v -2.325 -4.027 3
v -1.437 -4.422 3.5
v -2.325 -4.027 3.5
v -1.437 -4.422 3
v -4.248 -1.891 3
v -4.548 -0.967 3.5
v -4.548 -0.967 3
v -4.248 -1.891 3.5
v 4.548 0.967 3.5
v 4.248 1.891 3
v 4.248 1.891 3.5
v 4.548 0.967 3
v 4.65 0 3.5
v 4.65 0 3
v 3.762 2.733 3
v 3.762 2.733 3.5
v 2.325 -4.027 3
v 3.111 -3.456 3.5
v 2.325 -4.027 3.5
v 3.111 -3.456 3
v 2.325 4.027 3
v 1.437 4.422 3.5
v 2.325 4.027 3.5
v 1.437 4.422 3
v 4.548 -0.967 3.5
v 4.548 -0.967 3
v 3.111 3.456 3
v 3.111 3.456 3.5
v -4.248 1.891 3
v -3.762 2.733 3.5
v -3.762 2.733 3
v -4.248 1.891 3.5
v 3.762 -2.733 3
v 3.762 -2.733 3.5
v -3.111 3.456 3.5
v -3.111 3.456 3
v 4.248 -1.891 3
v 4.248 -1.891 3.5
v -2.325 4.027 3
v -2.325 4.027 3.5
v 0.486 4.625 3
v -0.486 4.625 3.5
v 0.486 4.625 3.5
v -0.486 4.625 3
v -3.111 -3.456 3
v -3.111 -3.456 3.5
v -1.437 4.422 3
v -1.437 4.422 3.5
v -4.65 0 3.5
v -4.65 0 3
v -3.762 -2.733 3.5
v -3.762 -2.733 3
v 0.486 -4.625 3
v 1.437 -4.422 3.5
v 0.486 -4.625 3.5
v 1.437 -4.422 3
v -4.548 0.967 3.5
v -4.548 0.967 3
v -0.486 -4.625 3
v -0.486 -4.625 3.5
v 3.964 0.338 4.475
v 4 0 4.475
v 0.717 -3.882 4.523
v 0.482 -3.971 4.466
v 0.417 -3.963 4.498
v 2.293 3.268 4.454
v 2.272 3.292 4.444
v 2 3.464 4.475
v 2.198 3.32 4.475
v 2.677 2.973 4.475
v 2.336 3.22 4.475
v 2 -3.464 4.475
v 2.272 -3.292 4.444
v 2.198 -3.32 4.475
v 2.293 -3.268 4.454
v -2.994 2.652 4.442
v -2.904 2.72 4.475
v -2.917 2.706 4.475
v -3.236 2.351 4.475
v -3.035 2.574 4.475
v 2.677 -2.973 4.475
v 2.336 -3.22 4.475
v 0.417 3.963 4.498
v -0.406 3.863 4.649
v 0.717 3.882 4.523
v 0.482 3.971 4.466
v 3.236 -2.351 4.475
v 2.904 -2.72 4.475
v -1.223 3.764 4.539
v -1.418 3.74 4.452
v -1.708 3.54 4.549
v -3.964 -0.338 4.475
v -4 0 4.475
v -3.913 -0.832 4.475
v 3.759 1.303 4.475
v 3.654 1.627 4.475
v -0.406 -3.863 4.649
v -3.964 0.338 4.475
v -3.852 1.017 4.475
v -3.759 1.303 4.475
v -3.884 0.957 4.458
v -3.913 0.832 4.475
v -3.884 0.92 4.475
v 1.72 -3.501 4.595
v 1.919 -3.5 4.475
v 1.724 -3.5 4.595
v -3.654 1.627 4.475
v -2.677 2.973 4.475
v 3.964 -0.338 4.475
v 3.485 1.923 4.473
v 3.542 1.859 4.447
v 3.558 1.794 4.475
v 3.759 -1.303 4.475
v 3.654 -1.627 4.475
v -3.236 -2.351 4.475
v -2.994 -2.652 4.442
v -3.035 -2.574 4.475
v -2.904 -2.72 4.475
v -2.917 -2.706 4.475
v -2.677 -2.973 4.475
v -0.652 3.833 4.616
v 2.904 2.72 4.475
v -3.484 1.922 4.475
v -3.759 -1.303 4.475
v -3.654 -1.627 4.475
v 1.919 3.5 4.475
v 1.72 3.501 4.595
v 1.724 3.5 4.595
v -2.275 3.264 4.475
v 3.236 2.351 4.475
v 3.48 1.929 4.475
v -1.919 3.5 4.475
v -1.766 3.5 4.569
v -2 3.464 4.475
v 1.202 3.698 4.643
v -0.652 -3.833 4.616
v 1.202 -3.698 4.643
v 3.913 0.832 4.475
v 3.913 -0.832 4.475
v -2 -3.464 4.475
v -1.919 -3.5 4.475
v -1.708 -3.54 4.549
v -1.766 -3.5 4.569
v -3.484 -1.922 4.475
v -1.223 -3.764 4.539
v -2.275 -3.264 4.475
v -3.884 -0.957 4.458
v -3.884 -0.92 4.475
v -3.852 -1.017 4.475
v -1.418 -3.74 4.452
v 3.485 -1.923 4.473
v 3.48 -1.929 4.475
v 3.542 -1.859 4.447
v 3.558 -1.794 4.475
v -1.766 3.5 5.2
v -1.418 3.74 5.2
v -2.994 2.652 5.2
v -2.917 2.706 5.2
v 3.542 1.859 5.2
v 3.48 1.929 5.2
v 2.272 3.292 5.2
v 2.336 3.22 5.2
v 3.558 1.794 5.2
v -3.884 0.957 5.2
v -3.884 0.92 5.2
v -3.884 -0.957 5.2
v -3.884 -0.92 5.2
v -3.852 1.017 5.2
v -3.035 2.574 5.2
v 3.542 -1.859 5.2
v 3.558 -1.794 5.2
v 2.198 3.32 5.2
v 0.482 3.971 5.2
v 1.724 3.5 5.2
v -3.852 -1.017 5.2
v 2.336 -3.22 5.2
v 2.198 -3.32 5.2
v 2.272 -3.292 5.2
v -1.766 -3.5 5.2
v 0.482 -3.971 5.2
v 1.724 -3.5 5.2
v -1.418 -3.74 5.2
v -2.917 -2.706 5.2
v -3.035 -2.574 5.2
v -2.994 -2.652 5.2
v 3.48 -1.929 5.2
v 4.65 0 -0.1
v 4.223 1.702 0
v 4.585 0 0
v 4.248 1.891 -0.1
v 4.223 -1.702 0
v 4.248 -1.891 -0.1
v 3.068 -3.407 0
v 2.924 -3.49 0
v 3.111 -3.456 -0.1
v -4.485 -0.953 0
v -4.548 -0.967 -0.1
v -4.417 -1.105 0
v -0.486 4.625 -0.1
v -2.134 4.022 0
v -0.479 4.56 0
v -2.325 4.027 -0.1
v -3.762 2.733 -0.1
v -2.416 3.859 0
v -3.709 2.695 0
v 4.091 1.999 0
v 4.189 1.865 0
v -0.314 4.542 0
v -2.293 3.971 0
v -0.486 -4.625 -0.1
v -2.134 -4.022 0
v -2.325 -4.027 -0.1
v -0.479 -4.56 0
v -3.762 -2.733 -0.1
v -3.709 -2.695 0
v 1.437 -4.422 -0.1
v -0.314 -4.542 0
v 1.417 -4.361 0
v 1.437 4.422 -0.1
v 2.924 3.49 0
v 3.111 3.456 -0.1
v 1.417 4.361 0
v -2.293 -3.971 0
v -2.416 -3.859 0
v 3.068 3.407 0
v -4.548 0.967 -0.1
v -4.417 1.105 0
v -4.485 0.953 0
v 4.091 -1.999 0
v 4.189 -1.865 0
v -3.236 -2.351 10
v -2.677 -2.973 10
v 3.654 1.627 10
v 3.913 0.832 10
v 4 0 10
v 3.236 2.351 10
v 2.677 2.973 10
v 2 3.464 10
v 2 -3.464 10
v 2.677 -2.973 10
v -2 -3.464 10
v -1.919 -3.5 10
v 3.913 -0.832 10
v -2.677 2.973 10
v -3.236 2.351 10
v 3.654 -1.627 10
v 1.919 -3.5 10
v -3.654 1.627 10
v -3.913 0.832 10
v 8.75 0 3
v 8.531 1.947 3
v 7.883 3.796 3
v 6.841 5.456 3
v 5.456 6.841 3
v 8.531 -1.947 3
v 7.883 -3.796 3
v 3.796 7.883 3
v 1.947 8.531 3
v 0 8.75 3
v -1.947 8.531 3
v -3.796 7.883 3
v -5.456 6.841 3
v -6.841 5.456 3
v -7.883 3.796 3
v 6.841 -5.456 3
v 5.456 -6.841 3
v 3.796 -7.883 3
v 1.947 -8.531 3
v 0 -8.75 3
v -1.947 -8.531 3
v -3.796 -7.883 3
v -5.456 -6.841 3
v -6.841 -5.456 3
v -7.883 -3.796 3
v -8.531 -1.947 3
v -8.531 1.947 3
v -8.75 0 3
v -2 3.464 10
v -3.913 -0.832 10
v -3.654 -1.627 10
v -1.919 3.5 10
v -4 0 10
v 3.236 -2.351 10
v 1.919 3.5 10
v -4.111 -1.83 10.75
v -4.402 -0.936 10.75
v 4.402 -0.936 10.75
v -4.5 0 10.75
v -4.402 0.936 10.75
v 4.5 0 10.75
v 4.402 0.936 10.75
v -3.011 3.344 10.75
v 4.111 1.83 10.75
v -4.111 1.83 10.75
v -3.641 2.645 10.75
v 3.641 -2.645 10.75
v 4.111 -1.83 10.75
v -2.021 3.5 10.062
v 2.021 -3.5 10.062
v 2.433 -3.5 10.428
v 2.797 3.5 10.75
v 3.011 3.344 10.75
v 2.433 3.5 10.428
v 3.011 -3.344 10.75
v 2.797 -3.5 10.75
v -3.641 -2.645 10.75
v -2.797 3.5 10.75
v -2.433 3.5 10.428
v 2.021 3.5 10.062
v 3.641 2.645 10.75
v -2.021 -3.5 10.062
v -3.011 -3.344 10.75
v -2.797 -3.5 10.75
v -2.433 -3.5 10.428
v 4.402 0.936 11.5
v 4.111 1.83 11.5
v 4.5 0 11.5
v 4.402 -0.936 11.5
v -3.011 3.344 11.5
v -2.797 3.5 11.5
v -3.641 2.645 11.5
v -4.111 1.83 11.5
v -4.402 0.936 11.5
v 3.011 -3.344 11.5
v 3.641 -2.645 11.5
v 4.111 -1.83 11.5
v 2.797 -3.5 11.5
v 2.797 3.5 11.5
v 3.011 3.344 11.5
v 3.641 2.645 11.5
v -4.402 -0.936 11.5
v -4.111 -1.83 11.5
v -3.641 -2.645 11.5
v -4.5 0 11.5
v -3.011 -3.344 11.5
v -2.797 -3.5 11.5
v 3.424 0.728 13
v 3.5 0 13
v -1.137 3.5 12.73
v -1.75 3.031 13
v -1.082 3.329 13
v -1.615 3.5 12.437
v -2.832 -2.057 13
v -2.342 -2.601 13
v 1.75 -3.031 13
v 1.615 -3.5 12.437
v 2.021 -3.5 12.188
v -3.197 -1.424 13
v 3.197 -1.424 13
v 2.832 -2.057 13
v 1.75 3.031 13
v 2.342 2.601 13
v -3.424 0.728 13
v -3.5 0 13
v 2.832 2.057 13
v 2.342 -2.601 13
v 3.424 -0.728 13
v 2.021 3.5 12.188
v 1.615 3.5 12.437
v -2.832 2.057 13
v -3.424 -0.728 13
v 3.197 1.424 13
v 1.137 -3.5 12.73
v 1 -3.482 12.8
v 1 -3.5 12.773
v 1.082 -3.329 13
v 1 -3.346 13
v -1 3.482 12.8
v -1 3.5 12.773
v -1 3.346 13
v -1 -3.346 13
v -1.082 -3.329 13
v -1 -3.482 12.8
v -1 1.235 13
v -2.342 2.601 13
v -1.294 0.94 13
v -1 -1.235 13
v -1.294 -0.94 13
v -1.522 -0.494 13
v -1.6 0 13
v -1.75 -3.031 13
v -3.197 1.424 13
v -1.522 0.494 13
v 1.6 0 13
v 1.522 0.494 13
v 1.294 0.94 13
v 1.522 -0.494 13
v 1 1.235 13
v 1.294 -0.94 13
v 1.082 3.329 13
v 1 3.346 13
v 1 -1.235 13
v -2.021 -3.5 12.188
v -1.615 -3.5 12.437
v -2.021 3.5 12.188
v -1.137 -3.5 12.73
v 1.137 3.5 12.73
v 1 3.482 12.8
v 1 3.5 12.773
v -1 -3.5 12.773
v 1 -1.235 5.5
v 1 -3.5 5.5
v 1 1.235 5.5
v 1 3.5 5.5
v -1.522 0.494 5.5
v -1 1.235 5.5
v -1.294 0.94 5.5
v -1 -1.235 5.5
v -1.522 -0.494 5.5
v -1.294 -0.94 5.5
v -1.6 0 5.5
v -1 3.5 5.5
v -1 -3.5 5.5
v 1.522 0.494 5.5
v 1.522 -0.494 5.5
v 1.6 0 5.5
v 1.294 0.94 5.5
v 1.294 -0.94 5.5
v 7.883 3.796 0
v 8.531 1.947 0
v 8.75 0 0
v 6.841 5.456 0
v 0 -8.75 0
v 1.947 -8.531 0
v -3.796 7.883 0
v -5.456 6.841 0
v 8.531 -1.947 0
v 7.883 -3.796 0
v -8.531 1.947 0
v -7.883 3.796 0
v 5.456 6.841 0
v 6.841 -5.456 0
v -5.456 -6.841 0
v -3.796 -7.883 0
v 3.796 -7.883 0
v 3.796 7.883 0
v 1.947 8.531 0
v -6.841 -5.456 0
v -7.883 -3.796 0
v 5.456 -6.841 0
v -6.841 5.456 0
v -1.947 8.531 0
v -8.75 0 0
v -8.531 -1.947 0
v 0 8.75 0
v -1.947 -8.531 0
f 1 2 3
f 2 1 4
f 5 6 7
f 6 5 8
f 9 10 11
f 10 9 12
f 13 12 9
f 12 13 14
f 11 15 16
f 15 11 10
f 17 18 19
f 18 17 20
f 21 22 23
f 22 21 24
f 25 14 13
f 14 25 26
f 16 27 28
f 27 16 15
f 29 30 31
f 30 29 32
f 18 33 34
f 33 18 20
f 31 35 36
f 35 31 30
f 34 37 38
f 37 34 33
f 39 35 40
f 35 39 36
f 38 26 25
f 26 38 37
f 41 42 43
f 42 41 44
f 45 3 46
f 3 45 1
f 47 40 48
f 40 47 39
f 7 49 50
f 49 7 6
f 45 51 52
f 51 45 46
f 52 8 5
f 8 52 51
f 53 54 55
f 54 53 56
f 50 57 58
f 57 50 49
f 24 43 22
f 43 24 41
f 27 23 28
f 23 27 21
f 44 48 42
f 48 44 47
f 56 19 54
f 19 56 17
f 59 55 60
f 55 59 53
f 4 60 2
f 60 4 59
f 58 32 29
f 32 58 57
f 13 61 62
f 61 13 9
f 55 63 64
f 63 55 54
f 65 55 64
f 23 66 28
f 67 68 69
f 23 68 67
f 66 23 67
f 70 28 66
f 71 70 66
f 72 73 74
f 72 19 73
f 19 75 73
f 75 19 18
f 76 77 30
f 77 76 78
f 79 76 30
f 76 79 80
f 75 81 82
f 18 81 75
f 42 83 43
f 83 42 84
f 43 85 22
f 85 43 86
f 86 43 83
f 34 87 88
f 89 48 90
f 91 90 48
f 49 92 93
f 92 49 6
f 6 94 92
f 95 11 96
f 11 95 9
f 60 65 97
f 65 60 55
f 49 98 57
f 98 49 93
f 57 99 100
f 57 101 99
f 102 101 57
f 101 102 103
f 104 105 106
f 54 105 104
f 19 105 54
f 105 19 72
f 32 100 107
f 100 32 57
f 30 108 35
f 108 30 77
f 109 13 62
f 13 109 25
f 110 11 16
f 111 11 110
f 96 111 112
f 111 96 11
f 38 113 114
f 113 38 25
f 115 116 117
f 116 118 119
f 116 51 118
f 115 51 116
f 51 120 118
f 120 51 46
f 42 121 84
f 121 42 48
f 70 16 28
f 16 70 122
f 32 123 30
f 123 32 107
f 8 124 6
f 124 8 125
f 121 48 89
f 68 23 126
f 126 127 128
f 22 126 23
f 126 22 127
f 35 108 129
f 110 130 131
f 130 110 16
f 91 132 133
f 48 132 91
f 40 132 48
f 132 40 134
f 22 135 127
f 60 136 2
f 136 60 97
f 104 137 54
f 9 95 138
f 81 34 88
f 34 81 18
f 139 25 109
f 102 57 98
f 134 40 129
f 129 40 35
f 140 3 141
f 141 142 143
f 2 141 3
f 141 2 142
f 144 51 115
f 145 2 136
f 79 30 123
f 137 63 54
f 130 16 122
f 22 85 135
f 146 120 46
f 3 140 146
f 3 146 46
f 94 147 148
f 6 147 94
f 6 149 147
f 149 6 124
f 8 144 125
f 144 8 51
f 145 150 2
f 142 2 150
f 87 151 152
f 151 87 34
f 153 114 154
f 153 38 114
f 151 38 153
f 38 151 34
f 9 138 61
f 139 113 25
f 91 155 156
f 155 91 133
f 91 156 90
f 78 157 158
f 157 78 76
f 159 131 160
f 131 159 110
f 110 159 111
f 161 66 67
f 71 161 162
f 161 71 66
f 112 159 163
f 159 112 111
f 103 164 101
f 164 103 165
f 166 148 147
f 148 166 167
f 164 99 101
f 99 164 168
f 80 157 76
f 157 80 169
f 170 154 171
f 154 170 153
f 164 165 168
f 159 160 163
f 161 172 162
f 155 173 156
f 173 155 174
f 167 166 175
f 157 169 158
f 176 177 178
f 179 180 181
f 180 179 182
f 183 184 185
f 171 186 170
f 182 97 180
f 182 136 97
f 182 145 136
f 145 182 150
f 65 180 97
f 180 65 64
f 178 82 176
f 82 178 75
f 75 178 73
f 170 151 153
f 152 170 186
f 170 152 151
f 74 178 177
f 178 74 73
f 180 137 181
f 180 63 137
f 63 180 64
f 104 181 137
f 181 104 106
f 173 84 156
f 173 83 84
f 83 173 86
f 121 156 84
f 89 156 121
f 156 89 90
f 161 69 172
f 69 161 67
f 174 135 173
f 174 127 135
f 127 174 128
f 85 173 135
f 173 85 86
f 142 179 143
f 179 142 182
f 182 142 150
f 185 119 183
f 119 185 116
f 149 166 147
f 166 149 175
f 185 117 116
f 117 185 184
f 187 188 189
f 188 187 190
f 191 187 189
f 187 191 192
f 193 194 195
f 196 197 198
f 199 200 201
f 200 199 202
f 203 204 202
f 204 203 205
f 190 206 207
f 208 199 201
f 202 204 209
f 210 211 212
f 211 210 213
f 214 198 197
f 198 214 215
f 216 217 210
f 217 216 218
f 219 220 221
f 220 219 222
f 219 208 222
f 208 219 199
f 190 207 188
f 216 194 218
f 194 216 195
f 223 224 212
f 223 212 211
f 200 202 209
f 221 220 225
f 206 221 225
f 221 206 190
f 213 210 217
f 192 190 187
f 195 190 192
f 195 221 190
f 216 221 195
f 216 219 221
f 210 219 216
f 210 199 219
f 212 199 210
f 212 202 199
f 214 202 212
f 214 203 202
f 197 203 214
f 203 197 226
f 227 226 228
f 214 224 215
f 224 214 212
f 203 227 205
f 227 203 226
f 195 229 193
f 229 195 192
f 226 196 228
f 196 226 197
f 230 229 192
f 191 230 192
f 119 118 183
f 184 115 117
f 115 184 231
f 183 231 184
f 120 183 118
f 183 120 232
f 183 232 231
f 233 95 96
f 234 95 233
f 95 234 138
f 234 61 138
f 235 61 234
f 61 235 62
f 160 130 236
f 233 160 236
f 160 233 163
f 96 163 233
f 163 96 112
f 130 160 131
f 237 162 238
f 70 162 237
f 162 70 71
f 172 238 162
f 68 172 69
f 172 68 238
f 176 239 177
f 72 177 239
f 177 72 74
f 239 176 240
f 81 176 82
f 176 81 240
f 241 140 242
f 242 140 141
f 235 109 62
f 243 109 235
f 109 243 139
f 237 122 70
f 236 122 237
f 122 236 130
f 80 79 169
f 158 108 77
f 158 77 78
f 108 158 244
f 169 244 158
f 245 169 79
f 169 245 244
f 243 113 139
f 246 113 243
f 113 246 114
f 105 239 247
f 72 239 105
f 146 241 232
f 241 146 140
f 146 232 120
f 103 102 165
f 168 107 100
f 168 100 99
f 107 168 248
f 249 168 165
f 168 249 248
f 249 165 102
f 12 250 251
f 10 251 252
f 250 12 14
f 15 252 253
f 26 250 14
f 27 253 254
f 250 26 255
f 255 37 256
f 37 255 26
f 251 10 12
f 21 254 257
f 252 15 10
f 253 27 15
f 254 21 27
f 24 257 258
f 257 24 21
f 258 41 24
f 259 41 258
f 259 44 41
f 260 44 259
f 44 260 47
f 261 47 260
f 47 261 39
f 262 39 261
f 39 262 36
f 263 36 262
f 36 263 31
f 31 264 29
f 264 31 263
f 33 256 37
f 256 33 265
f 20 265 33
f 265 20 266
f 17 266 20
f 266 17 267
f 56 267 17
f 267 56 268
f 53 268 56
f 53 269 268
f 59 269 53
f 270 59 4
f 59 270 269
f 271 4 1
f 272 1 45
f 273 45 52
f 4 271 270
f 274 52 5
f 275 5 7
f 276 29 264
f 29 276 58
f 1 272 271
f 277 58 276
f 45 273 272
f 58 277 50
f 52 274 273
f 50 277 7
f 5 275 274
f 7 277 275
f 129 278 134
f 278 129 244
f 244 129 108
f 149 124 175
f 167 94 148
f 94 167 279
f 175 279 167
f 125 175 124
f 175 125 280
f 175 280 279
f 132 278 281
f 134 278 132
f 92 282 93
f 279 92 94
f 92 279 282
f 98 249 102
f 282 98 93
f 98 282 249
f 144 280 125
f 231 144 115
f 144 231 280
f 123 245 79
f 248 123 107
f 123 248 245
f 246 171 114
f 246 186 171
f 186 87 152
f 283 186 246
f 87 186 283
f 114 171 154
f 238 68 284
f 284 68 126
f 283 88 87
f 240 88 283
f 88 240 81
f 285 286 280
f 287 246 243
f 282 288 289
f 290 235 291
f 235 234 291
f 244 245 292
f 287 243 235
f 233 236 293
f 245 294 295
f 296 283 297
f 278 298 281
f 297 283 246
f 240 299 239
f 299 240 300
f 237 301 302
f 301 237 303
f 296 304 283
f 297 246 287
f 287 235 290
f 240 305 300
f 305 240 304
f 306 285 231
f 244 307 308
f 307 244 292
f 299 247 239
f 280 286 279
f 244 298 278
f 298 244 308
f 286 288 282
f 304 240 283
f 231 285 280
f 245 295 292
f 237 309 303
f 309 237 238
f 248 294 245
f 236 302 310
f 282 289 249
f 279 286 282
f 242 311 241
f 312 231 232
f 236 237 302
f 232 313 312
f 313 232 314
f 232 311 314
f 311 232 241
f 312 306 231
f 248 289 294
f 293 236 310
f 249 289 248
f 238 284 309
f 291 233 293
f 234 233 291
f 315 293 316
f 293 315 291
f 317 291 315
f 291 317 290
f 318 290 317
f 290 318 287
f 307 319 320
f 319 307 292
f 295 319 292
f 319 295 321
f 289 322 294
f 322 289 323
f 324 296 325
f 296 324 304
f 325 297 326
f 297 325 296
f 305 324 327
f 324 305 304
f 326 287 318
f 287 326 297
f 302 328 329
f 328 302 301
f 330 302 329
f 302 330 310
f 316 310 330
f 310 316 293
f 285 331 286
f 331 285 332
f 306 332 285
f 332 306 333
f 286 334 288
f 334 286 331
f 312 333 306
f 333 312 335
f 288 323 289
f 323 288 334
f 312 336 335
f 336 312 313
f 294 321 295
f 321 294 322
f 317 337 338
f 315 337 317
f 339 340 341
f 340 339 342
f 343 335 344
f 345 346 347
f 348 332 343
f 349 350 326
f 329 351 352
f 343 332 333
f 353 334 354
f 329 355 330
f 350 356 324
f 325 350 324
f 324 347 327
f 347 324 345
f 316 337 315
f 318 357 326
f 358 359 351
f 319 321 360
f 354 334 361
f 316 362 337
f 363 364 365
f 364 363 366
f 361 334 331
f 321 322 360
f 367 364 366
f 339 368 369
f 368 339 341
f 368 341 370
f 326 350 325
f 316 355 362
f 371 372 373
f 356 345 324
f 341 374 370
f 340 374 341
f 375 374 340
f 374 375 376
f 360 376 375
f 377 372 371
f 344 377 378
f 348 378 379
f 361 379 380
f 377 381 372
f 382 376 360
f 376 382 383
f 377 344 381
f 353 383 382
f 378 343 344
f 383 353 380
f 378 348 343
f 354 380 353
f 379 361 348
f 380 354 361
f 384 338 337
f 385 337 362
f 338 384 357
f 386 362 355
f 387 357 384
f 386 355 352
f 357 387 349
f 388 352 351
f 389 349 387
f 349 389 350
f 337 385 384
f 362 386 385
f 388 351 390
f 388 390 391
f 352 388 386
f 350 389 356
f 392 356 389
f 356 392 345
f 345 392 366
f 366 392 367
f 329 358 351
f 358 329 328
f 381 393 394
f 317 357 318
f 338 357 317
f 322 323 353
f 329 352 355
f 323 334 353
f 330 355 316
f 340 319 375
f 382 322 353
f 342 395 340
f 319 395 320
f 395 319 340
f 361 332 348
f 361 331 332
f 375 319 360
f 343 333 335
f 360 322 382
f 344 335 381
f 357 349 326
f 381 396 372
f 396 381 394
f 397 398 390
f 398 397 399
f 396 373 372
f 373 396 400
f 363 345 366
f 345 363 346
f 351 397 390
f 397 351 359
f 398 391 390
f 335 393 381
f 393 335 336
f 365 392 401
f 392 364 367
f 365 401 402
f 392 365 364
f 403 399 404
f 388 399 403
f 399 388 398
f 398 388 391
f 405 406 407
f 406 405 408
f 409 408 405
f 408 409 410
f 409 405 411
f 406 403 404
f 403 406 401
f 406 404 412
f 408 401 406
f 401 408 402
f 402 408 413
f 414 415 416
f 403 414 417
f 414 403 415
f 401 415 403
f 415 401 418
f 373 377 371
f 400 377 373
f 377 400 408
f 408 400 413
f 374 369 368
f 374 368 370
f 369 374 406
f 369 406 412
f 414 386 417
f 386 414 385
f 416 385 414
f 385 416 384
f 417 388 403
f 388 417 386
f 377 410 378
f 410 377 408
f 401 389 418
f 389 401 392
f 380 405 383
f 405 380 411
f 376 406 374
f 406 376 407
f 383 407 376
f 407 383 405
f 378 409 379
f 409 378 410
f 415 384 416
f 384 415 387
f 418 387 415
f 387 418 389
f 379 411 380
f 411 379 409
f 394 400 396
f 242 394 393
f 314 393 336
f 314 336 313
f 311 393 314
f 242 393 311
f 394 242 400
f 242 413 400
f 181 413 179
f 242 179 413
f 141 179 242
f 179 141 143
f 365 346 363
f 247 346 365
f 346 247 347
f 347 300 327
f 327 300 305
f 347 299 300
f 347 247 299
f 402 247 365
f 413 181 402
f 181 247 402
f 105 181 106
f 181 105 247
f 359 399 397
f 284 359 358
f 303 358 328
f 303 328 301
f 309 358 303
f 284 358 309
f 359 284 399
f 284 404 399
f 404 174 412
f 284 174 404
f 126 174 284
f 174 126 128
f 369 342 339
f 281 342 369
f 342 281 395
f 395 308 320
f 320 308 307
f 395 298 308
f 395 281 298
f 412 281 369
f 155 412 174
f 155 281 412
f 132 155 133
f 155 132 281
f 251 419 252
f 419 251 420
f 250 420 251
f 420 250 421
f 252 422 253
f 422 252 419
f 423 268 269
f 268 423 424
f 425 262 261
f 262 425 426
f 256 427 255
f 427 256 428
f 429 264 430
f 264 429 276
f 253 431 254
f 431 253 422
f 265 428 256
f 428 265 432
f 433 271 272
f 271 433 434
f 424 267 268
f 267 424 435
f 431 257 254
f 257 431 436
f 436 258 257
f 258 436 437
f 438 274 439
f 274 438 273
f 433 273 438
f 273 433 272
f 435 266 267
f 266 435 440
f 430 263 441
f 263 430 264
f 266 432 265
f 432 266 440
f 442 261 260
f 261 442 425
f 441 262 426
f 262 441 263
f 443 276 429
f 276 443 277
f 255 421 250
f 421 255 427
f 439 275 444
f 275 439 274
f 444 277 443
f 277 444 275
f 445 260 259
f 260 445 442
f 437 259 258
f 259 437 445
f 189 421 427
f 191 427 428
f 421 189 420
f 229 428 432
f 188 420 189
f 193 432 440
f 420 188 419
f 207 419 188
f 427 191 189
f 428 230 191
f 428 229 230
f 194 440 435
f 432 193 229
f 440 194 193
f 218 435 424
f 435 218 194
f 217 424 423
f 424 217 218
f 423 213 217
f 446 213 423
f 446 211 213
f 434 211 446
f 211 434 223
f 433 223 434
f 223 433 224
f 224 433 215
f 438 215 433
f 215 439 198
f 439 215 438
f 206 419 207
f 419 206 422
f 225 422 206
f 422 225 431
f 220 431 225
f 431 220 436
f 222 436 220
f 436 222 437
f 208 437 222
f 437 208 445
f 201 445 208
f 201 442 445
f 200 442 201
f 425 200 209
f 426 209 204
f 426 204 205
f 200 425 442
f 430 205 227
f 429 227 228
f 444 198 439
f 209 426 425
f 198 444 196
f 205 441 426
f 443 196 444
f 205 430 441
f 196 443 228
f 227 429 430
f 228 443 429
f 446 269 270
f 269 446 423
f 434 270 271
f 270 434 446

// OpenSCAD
// Pin Connectors V2
// Tony Buser <tbuser@gmail.com>

 pinhole(h=5);

// test();
 pintack(h=10);
// pinpeg(h=20);

module test() {
  tolerance = 0.3;
  
  translate([-12, 12, 0]) pinpeg(h=20);
  translate([12, 12, 0]) pintack(h=10);
  
  difference() {
    union() {
      translate([0, -12, 2.5]) cube(size = [59, 20, 5], center = true);
      translate([24, -12, 7.5]) cube(size = [12, 20, 15], center = true);
    }
    translate([-24, -12, 0]) pinhole(h=5, t=tolerance);
    translate([-12, -12, 0]) pinhole(h=5, t=tolerance, tight=false);
    translate([0, -12, 0]) pinhole(h=10, t=tolerance);
    translate([12, -12, 0]) pinhole(h=10, t=tolerance, tight=false);
    translate([24, -12, 15]) rotate([0, 180, 0]) pinhole(h=10, t=tolerance);
  }
}

module pinhole(h=10, r=4, lh=3, lt=1, t=0.3, tight=true) {
  // h = shaft height
  // r = shaft radius
  // lh = lip height
  // lt = lip thickness
  // t = tolerance
  // tight = set to false if you want a joint that spins easily
  
  union() {
    pin_solid(h, r+(t/2), lh, lt);
    cylinder(h=h+0.2, r=r);
    // widen the cylinder slightly
    // cylinder(h=h+0.2, r=r+(t-0.2/2));
    if (tight == false) {
      cylinder(h=h+0.2, r=r+(t/2)+0.25);
    }
    // widen the entrance hole to make insertion easier
    translate([0, 0, -0.1]) cylinder(h=lh/3, r2=r, r1=r+(t/2)+(lt/2));
  }
}

module pin(h=10, r=4, lh=3, lt=1, side=false) {
  // h = shaft height
  // r = shaft radius
  // lh = lip height
  // lt = lip thickness
  // side = set to true if you want it printed horizontally

  if (side) {
    pin_horizontal(h, r, lh, lt);
  } else {
    pin_vertical(h, r, lh, lt);
  }
}

module pintack(h=10, r=4, lh=3, lt=1, bh=3, br=8.75) {
  // bh = base_height
  // br = base_radius
  
  union() {
    cylinder(h=bh, r=br);
    translate([0, 0, bh]) pin(h, r, lh, lt);
  }
}

module pinpeg(h=20, r=4, lh=3, lt=1) {
  union() {
    translate([0, -h/4+0.05, 0]) pin(h/2+0.1, r, lh, lt, side=true);
    translate([0, h/4-0.05, 0]) rotate([0, 0, 180]) pin(h/2+0.1, r, lh, lt, side=true);
  }
}

// just call pin instead, I made this module because it was easier to do the rotation option this way
// since openscad complains of recursion if I did it all in one module
module pin_vertical(h=10, r=4, lh=3, lt=1) {
  // h = shaft height
  // r = shaft radius
  // lh = lip height
  // lt = lip thickness

  difference() {
    pin_solid(h, r, lh, lt);
    
    // center cut
    translate([-r*0.5/2, -(r*2+lt*2)/2, h/4]) cube([r*0.5, r*2+lt*2, h]);
    translate([0, 0, h/4]) cylinder(h=h+lh, r=r/2.5, $fn=20);
    // center curve
    // translate([0, 0, h/4]) rotate([90, 0, 0]) cylinder(h=r*2, r=r*0.5/2, center=true, $fn=20);
  
    // side cuts
    translate([-r*2, -lt-r*1.125, -1]) cube([r*4, lt*2, h+2]);
    translate([-r*2, -lt+r*1.125, -1]) cube([r*4, lt*2, h+2]);
  }
}

// call pin with side=true instead of this
module pin_horizontal(h=10, r=4, lh=3, lt=1) {
  // h = shaft height
  // r = shaft radius
  // lh = lip height
  // lt = lip thickness
  translate([0, h/2, r*1.125-lt]) rotate([90, 0, 0]) pin_vertical(h, r, lh, lt);
}

// this is mainly to make the pinhole module easier
module pin_solid(h=10, r=4, lh=3, lt=1) {
  union() {
    // shaft
    cylinder(h=h-lh, r=r, $fn=30);
    // lip
    // translate([0, 0, h-lh]) cylinder(h=lh*0.25, r1=r, r2=r+(lt/2), $fn=30);
    // translate([0, 0, h-lh+lh*0.25]) cylinder(h=lh*0.25, r2=r, r1=r+(lt/2), $fn=30);
    // translate([0, 0, h-lh+lh*0.50]) cylinder(h=lh*0.50, r1=r, r2=r-(lt/2), $fn=30);

    // translate([0, 0, h-lh]) cylinder(h=lh*0.50, r1=r, r2=r+(lt/2), $fn=30);
    // translate([0, 0, h-lh+lh*0.50]) cylinder(h=lh*0.50, r1=r+(lt/2), r2=r-(lt/3), $fn=30);    

    translate([0, 0, h-lh]) cylinder(h=lh*0.25, r1=r, r2=r+(lt/2), $fn=30);
    translate([0, 0, h-lh+lh*0.25]) cylinder(h=lh*0.25, r=r+(lt/2), $fn=30);    
    translate([0, 0, h-lh+lh*0.50]) cylinder(h=lh*0.50, r1=r+(lt/2), r2=r-(lt/2), $fn=30);    

    // translate([0, 0, h-lh]) cylinder(h=lh, r1=r+(lt/2), r2=1, $fn=30);
    // translate([0, 0, h-lh-lt/2]) cylinder(h=lt/2, r1=r, r2=r+(lt/2), $fn=30);
  }
}
